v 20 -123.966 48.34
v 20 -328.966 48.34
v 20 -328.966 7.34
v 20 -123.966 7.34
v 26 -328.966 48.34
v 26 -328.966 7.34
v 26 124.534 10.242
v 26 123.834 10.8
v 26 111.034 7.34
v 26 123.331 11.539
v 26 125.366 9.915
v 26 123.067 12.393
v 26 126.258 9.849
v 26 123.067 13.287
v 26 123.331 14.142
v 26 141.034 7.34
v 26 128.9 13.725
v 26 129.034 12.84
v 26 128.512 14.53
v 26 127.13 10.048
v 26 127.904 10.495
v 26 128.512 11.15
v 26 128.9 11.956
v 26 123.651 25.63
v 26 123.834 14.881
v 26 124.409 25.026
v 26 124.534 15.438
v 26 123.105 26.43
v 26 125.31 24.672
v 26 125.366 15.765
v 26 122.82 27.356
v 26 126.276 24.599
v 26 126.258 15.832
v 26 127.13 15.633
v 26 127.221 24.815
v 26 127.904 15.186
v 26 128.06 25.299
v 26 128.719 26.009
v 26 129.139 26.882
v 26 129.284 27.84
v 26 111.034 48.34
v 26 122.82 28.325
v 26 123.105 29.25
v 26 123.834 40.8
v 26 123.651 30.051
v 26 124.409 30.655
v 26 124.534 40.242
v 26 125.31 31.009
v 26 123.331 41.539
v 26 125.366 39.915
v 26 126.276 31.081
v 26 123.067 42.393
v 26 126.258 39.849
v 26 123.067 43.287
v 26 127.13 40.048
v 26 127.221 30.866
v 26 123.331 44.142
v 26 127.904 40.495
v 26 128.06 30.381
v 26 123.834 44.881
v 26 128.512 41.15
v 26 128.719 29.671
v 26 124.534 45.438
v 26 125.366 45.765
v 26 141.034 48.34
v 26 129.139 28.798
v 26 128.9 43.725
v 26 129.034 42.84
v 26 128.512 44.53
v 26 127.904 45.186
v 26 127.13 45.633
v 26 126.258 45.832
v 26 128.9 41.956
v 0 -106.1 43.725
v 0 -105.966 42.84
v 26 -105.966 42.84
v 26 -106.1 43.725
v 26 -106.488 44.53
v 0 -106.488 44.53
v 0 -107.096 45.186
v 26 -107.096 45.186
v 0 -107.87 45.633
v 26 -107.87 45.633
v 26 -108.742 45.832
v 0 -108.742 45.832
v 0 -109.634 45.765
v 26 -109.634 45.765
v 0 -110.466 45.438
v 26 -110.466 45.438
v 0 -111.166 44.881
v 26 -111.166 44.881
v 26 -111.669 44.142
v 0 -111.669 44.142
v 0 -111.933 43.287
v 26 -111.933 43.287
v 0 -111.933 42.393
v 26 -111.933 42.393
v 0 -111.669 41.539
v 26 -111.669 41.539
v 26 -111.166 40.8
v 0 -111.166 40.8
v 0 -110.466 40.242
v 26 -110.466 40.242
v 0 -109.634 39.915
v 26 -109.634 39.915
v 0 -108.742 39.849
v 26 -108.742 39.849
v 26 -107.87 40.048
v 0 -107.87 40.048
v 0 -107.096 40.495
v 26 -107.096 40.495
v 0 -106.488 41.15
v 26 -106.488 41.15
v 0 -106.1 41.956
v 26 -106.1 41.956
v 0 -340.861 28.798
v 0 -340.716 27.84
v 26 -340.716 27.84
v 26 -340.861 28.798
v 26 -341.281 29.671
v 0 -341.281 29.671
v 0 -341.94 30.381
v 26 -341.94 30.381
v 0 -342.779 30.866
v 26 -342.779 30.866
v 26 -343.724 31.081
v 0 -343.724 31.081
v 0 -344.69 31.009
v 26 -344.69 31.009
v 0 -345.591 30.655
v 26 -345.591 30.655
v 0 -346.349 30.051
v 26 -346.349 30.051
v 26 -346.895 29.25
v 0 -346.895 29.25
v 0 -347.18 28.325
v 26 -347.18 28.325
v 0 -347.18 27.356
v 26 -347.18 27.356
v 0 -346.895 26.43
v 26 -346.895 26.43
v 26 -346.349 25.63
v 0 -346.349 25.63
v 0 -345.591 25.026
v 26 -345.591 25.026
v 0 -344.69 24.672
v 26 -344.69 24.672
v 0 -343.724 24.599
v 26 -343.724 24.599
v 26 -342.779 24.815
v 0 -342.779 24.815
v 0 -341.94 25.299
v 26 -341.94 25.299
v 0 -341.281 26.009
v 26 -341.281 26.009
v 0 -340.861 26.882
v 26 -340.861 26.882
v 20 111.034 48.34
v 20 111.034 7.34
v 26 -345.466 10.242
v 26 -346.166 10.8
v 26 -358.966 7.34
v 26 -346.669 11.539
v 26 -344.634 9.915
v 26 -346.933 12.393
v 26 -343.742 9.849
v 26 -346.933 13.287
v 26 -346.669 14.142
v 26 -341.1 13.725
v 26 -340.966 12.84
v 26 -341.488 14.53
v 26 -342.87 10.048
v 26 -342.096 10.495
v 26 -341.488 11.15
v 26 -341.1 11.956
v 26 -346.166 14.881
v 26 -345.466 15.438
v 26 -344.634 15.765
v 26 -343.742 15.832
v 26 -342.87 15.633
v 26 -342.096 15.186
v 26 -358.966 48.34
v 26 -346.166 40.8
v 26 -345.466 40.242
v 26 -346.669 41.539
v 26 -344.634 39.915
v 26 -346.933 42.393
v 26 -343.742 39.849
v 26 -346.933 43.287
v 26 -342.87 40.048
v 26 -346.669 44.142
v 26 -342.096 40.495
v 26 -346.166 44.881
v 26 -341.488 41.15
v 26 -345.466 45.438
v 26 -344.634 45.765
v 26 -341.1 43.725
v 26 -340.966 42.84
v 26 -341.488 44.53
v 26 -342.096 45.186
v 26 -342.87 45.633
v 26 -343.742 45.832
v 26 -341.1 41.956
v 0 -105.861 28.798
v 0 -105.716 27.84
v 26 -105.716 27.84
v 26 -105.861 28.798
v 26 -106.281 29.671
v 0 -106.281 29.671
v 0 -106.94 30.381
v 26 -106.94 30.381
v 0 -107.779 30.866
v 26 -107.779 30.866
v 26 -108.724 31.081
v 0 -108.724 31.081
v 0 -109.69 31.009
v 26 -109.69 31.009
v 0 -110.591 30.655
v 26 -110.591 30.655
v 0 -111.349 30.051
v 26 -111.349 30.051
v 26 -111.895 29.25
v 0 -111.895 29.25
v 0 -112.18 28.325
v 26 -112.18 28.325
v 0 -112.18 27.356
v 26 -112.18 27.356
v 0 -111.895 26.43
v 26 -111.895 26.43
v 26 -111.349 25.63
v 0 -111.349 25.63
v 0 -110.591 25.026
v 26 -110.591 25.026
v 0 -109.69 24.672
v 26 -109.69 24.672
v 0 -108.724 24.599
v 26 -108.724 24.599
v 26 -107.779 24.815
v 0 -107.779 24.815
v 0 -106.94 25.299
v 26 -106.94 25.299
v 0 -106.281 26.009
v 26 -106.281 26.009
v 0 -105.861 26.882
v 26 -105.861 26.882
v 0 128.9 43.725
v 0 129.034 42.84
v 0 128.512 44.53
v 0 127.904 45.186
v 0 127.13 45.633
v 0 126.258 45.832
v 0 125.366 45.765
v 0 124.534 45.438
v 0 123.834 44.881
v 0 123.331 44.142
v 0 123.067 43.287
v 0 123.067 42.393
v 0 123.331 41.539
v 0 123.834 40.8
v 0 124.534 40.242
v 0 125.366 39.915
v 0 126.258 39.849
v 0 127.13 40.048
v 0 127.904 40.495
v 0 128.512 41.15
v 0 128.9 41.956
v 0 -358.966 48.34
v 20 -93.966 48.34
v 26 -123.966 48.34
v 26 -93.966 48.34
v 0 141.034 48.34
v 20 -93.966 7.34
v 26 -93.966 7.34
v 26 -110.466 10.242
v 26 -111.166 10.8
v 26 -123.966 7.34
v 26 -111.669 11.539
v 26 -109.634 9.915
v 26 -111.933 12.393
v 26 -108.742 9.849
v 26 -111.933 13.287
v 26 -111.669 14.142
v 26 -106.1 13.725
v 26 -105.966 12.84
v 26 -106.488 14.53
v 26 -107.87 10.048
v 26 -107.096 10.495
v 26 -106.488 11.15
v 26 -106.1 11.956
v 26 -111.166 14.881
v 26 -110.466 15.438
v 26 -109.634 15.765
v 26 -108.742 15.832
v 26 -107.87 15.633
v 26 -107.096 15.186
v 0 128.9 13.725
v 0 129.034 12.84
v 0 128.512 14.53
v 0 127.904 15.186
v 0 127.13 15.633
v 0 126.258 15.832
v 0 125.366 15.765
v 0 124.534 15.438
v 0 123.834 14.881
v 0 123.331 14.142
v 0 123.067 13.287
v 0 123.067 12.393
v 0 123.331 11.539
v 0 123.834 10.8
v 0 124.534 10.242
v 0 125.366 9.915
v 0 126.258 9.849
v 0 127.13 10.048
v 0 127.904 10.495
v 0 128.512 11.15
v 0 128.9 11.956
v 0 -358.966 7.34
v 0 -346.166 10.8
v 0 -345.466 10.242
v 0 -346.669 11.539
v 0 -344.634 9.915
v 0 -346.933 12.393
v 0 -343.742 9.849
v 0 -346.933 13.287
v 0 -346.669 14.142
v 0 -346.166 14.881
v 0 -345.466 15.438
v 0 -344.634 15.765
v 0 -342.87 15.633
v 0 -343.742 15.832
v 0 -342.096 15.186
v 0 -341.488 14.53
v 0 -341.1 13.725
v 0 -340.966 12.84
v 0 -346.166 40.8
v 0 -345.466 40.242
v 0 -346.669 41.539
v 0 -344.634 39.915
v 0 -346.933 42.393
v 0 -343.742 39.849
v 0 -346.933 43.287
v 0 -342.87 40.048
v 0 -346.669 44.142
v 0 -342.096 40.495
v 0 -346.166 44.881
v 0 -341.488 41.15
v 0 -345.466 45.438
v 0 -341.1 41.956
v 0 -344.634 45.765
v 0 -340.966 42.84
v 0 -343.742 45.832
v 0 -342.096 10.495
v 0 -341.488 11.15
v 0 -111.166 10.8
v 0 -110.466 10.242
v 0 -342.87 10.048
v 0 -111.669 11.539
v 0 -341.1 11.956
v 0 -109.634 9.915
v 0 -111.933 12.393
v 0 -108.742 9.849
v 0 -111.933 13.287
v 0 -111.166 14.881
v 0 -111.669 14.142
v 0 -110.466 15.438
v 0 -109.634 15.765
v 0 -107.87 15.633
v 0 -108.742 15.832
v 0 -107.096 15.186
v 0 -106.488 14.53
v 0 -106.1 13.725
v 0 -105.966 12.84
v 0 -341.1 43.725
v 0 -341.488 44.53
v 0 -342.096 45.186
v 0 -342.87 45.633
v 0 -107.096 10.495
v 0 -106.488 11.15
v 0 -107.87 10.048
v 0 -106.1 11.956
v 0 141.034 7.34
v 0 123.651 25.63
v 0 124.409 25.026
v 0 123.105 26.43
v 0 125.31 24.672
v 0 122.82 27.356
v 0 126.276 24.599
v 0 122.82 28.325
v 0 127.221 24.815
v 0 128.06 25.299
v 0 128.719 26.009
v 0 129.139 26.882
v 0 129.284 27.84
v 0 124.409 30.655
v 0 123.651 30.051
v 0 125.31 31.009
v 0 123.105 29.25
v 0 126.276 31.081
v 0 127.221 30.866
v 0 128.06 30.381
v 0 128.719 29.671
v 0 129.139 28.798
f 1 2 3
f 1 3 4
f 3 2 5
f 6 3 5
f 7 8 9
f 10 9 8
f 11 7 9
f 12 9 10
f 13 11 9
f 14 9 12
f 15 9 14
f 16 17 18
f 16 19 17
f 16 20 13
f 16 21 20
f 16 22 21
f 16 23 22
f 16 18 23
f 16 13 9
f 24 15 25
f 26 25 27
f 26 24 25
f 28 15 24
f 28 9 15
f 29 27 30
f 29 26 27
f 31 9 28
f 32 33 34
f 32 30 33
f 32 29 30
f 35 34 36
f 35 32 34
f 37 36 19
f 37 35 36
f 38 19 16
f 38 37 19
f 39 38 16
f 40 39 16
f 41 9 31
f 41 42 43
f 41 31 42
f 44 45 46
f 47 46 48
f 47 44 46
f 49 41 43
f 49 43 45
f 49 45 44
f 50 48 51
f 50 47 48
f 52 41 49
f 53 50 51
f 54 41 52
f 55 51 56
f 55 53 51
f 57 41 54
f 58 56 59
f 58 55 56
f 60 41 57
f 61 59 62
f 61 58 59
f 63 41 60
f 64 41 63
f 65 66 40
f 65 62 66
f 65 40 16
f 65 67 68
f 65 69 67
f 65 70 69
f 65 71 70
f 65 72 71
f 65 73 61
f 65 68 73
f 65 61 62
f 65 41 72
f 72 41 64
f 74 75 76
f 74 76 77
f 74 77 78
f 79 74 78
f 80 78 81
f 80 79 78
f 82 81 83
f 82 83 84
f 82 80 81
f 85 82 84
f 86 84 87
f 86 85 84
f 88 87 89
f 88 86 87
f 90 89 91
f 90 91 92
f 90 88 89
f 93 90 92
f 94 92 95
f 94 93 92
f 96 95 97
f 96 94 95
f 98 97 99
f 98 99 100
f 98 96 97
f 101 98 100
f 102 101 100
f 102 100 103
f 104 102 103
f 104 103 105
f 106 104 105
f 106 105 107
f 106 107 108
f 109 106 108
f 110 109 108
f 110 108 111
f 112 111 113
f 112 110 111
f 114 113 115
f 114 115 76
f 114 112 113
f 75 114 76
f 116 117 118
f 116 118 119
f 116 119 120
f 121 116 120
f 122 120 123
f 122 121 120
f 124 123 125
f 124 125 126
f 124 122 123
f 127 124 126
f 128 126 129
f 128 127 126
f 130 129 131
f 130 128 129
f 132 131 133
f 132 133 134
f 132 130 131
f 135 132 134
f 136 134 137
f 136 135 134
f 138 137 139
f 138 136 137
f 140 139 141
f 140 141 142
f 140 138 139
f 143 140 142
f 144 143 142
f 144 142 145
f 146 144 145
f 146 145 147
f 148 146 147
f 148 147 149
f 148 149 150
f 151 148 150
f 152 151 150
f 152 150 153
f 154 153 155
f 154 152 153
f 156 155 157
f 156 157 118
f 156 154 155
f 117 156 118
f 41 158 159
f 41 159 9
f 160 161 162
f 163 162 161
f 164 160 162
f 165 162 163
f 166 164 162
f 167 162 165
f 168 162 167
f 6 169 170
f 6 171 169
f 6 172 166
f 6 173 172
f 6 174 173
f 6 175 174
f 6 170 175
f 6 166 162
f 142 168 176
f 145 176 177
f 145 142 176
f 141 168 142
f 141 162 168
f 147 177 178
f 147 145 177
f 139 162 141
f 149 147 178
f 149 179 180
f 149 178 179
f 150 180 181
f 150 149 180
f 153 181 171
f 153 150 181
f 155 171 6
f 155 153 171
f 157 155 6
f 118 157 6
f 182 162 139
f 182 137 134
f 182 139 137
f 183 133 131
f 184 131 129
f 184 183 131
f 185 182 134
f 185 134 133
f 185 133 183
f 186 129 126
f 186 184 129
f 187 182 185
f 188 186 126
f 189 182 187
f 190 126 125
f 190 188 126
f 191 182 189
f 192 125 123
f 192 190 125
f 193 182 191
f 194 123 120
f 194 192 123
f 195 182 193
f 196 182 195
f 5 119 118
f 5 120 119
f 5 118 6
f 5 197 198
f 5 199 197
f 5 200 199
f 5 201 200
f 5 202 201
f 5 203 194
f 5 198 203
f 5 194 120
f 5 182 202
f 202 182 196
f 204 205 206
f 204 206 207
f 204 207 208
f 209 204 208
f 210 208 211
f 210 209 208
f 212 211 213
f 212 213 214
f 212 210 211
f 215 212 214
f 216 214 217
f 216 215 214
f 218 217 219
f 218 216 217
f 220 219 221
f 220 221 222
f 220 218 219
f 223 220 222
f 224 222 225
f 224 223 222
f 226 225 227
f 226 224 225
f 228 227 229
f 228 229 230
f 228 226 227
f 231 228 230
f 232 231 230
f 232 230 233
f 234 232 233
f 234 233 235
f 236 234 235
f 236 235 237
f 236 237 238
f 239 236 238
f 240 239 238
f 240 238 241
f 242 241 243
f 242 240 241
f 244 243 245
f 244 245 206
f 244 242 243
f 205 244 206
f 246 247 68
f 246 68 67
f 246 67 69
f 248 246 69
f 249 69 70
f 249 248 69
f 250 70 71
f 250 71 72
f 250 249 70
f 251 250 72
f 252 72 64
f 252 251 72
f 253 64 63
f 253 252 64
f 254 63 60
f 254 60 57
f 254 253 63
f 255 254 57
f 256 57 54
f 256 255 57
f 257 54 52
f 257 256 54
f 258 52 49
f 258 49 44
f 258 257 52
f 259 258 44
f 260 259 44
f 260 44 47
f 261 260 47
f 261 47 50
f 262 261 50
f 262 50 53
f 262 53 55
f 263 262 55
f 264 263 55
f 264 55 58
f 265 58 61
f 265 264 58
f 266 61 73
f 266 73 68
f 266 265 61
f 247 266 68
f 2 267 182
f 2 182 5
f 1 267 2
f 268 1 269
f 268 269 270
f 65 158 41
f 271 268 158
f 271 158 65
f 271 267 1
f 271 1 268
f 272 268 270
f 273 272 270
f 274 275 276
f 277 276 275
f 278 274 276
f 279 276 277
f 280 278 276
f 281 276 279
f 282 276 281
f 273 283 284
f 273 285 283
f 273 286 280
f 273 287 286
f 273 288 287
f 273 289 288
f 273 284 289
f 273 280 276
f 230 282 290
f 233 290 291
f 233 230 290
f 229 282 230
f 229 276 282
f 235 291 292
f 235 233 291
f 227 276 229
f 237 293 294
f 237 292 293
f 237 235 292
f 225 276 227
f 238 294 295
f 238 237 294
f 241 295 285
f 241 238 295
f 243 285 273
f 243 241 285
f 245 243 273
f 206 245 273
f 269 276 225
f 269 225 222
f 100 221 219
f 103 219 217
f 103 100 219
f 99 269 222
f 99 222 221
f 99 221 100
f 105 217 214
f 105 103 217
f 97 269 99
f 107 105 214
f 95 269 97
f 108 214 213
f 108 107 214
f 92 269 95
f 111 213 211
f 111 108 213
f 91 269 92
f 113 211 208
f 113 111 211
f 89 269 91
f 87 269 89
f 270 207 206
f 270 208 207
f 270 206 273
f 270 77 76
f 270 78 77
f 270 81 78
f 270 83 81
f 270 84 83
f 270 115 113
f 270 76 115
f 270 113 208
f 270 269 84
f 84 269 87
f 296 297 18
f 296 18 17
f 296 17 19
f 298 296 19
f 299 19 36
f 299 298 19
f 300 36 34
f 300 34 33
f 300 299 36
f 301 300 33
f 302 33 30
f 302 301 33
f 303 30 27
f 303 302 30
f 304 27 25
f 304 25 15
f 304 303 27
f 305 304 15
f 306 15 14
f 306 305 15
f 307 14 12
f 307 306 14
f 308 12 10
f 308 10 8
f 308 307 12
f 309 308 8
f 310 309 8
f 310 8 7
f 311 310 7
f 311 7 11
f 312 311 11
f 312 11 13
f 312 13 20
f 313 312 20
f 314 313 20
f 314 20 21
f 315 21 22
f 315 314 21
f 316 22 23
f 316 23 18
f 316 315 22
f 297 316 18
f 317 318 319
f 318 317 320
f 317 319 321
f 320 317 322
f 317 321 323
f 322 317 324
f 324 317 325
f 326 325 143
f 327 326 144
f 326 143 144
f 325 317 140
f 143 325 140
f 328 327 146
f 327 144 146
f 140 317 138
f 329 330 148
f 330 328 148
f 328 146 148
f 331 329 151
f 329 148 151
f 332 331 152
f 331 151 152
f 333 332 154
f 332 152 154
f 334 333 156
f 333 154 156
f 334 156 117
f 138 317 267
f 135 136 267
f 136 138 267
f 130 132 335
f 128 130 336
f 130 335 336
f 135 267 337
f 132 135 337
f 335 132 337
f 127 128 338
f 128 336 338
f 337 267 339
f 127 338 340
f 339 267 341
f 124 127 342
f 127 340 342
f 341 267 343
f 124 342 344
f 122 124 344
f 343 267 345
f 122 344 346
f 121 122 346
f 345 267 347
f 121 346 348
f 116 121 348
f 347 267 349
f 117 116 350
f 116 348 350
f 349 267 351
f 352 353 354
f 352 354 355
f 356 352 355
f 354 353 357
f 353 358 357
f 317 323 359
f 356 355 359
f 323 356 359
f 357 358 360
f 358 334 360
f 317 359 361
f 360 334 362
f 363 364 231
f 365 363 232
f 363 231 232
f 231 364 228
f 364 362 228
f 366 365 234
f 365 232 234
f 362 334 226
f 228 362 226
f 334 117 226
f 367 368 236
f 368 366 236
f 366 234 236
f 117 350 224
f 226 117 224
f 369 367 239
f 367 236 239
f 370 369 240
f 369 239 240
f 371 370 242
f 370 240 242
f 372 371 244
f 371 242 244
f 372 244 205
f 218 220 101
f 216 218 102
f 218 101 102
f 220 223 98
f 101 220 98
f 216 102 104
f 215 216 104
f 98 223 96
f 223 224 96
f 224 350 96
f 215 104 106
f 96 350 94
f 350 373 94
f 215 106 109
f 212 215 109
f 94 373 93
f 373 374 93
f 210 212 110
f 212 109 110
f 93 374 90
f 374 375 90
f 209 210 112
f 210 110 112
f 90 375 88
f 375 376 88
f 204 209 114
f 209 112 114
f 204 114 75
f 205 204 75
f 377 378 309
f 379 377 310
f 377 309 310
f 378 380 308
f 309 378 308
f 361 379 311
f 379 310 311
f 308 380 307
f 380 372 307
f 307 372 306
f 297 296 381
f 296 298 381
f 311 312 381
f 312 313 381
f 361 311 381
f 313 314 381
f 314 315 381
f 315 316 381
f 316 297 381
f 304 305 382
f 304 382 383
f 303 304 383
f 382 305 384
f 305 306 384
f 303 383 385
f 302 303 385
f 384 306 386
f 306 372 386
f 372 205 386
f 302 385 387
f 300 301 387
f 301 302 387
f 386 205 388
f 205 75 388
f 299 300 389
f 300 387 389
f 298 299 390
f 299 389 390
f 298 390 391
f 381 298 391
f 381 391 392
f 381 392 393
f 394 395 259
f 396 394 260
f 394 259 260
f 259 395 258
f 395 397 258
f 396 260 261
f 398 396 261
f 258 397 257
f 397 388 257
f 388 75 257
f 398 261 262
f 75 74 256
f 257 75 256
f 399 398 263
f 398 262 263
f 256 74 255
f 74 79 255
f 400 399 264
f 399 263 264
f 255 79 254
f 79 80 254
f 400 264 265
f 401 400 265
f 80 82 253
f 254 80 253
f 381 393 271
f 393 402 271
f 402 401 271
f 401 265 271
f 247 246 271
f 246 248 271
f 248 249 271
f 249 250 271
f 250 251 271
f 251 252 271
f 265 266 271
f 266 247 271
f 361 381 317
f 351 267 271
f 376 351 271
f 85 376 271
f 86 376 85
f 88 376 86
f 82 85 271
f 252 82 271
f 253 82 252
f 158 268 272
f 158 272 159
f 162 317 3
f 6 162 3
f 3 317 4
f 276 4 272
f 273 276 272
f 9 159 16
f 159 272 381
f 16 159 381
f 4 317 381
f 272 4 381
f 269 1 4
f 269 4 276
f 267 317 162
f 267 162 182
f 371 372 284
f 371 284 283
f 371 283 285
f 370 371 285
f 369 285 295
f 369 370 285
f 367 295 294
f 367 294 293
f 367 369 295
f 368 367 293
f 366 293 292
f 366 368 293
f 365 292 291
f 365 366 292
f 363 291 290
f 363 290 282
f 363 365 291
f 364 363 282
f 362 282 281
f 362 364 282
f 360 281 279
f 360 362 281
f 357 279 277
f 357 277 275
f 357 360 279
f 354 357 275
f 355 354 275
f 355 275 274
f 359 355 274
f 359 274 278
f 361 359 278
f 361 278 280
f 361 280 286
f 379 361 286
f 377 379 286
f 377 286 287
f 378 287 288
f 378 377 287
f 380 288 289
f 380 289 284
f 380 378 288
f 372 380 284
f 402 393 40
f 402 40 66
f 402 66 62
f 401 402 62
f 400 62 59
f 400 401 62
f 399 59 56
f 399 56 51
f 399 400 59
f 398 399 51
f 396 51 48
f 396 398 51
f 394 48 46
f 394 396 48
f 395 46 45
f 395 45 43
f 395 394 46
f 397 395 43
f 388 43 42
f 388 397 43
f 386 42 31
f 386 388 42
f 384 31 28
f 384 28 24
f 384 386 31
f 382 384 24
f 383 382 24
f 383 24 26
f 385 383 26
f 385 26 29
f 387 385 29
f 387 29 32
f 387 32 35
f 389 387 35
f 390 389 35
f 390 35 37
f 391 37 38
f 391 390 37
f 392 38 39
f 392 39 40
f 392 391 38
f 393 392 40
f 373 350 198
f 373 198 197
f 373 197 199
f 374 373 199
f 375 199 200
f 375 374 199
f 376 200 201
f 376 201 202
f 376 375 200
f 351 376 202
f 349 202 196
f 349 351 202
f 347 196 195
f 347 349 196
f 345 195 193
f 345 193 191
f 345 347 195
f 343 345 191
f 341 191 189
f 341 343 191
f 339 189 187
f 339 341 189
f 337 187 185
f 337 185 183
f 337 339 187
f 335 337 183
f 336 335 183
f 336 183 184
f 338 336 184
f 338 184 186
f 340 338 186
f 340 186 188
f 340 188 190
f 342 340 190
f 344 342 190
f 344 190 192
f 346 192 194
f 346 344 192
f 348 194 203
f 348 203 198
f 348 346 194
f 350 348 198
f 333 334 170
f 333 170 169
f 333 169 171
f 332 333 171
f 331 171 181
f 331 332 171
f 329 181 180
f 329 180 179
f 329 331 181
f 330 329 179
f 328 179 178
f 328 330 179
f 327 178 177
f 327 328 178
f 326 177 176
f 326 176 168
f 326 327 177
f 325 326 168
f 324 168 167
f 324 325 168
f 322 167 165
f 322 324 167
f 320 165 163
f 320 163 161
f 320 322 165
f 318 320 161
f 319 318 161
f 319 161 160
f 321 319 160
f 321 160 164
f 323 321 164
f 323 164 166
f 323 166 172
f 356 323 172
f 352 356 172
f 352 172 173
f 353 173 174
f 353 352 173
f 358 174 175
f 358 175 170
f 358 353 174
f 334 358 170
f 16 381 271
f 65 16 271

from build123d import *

# Parameters (mm, degrees)
F0_W     = 500
F0_H     = 41
F0_R     = 3
F0_R_2   = 3.25
F1_DEPTH = 26
F2_W     = 6
F2_H     = 205
F3_DEPTH = 41


with BuildPart() as f1:
    # F0 (on Right) → F1 (new body)
    with BuildSketch(Plane.YZ):
        with Locations((-108.96641, 27.840261)):
            Rectangle(F0_W, F0_H)
        with Locations((-343.96641, 12.840261)):
            Circle(F0_R, mode=Mode.SUBTRACT)
        with Locations((-343.96641, 27.840261)):
            Circle(F0_R_2, mode=Mode.SUBTRACT)
        with Locations((-108.96641, 12.840261)):
            Circle(F0_R, mode=Mode.SUBTRACT)
        with Locations((126.03359, 12.840261)):
            Circle(F0_R, mode=Mode.SUBTRACT)
        with Locations((-343.96641, 42.840261)):
            Circle(F0_R, mode=Mode.SUBTRACT)
        with Locations((-108.96641, 27.840261)):
            Circle(F0_R_2, mode=Mode.SUBTRACT)
        with Locations((126.03359, 27.840261)):
            Circle(F0_R_2, mode=Mode.SUBTRACT)
        with Locations((-108.96641, 42.840261)):
            Circle(F0_R, mode=Mode.SUBTRACT)
        with Locations((126.03359, 42.840261)):
            Circle(F0_R, mode=Mode.SUBTRACT)
    extrude(amount=F1_DEPTH)

    # F2 (on face) → F3 (cut, through all)
    with BuildSketch(Plane.XY.offset(48.340261)):
        with Locations((23, -226.46641)):
            Rectangle(F2_W, F2_H)
        with Locations((23, 8.53359)):
            Rectangle(F2_W, F2_H)
    extrude(amount=-F3_DEPTH, mode=Mode.SUBTRACT)


solid = f1.part
